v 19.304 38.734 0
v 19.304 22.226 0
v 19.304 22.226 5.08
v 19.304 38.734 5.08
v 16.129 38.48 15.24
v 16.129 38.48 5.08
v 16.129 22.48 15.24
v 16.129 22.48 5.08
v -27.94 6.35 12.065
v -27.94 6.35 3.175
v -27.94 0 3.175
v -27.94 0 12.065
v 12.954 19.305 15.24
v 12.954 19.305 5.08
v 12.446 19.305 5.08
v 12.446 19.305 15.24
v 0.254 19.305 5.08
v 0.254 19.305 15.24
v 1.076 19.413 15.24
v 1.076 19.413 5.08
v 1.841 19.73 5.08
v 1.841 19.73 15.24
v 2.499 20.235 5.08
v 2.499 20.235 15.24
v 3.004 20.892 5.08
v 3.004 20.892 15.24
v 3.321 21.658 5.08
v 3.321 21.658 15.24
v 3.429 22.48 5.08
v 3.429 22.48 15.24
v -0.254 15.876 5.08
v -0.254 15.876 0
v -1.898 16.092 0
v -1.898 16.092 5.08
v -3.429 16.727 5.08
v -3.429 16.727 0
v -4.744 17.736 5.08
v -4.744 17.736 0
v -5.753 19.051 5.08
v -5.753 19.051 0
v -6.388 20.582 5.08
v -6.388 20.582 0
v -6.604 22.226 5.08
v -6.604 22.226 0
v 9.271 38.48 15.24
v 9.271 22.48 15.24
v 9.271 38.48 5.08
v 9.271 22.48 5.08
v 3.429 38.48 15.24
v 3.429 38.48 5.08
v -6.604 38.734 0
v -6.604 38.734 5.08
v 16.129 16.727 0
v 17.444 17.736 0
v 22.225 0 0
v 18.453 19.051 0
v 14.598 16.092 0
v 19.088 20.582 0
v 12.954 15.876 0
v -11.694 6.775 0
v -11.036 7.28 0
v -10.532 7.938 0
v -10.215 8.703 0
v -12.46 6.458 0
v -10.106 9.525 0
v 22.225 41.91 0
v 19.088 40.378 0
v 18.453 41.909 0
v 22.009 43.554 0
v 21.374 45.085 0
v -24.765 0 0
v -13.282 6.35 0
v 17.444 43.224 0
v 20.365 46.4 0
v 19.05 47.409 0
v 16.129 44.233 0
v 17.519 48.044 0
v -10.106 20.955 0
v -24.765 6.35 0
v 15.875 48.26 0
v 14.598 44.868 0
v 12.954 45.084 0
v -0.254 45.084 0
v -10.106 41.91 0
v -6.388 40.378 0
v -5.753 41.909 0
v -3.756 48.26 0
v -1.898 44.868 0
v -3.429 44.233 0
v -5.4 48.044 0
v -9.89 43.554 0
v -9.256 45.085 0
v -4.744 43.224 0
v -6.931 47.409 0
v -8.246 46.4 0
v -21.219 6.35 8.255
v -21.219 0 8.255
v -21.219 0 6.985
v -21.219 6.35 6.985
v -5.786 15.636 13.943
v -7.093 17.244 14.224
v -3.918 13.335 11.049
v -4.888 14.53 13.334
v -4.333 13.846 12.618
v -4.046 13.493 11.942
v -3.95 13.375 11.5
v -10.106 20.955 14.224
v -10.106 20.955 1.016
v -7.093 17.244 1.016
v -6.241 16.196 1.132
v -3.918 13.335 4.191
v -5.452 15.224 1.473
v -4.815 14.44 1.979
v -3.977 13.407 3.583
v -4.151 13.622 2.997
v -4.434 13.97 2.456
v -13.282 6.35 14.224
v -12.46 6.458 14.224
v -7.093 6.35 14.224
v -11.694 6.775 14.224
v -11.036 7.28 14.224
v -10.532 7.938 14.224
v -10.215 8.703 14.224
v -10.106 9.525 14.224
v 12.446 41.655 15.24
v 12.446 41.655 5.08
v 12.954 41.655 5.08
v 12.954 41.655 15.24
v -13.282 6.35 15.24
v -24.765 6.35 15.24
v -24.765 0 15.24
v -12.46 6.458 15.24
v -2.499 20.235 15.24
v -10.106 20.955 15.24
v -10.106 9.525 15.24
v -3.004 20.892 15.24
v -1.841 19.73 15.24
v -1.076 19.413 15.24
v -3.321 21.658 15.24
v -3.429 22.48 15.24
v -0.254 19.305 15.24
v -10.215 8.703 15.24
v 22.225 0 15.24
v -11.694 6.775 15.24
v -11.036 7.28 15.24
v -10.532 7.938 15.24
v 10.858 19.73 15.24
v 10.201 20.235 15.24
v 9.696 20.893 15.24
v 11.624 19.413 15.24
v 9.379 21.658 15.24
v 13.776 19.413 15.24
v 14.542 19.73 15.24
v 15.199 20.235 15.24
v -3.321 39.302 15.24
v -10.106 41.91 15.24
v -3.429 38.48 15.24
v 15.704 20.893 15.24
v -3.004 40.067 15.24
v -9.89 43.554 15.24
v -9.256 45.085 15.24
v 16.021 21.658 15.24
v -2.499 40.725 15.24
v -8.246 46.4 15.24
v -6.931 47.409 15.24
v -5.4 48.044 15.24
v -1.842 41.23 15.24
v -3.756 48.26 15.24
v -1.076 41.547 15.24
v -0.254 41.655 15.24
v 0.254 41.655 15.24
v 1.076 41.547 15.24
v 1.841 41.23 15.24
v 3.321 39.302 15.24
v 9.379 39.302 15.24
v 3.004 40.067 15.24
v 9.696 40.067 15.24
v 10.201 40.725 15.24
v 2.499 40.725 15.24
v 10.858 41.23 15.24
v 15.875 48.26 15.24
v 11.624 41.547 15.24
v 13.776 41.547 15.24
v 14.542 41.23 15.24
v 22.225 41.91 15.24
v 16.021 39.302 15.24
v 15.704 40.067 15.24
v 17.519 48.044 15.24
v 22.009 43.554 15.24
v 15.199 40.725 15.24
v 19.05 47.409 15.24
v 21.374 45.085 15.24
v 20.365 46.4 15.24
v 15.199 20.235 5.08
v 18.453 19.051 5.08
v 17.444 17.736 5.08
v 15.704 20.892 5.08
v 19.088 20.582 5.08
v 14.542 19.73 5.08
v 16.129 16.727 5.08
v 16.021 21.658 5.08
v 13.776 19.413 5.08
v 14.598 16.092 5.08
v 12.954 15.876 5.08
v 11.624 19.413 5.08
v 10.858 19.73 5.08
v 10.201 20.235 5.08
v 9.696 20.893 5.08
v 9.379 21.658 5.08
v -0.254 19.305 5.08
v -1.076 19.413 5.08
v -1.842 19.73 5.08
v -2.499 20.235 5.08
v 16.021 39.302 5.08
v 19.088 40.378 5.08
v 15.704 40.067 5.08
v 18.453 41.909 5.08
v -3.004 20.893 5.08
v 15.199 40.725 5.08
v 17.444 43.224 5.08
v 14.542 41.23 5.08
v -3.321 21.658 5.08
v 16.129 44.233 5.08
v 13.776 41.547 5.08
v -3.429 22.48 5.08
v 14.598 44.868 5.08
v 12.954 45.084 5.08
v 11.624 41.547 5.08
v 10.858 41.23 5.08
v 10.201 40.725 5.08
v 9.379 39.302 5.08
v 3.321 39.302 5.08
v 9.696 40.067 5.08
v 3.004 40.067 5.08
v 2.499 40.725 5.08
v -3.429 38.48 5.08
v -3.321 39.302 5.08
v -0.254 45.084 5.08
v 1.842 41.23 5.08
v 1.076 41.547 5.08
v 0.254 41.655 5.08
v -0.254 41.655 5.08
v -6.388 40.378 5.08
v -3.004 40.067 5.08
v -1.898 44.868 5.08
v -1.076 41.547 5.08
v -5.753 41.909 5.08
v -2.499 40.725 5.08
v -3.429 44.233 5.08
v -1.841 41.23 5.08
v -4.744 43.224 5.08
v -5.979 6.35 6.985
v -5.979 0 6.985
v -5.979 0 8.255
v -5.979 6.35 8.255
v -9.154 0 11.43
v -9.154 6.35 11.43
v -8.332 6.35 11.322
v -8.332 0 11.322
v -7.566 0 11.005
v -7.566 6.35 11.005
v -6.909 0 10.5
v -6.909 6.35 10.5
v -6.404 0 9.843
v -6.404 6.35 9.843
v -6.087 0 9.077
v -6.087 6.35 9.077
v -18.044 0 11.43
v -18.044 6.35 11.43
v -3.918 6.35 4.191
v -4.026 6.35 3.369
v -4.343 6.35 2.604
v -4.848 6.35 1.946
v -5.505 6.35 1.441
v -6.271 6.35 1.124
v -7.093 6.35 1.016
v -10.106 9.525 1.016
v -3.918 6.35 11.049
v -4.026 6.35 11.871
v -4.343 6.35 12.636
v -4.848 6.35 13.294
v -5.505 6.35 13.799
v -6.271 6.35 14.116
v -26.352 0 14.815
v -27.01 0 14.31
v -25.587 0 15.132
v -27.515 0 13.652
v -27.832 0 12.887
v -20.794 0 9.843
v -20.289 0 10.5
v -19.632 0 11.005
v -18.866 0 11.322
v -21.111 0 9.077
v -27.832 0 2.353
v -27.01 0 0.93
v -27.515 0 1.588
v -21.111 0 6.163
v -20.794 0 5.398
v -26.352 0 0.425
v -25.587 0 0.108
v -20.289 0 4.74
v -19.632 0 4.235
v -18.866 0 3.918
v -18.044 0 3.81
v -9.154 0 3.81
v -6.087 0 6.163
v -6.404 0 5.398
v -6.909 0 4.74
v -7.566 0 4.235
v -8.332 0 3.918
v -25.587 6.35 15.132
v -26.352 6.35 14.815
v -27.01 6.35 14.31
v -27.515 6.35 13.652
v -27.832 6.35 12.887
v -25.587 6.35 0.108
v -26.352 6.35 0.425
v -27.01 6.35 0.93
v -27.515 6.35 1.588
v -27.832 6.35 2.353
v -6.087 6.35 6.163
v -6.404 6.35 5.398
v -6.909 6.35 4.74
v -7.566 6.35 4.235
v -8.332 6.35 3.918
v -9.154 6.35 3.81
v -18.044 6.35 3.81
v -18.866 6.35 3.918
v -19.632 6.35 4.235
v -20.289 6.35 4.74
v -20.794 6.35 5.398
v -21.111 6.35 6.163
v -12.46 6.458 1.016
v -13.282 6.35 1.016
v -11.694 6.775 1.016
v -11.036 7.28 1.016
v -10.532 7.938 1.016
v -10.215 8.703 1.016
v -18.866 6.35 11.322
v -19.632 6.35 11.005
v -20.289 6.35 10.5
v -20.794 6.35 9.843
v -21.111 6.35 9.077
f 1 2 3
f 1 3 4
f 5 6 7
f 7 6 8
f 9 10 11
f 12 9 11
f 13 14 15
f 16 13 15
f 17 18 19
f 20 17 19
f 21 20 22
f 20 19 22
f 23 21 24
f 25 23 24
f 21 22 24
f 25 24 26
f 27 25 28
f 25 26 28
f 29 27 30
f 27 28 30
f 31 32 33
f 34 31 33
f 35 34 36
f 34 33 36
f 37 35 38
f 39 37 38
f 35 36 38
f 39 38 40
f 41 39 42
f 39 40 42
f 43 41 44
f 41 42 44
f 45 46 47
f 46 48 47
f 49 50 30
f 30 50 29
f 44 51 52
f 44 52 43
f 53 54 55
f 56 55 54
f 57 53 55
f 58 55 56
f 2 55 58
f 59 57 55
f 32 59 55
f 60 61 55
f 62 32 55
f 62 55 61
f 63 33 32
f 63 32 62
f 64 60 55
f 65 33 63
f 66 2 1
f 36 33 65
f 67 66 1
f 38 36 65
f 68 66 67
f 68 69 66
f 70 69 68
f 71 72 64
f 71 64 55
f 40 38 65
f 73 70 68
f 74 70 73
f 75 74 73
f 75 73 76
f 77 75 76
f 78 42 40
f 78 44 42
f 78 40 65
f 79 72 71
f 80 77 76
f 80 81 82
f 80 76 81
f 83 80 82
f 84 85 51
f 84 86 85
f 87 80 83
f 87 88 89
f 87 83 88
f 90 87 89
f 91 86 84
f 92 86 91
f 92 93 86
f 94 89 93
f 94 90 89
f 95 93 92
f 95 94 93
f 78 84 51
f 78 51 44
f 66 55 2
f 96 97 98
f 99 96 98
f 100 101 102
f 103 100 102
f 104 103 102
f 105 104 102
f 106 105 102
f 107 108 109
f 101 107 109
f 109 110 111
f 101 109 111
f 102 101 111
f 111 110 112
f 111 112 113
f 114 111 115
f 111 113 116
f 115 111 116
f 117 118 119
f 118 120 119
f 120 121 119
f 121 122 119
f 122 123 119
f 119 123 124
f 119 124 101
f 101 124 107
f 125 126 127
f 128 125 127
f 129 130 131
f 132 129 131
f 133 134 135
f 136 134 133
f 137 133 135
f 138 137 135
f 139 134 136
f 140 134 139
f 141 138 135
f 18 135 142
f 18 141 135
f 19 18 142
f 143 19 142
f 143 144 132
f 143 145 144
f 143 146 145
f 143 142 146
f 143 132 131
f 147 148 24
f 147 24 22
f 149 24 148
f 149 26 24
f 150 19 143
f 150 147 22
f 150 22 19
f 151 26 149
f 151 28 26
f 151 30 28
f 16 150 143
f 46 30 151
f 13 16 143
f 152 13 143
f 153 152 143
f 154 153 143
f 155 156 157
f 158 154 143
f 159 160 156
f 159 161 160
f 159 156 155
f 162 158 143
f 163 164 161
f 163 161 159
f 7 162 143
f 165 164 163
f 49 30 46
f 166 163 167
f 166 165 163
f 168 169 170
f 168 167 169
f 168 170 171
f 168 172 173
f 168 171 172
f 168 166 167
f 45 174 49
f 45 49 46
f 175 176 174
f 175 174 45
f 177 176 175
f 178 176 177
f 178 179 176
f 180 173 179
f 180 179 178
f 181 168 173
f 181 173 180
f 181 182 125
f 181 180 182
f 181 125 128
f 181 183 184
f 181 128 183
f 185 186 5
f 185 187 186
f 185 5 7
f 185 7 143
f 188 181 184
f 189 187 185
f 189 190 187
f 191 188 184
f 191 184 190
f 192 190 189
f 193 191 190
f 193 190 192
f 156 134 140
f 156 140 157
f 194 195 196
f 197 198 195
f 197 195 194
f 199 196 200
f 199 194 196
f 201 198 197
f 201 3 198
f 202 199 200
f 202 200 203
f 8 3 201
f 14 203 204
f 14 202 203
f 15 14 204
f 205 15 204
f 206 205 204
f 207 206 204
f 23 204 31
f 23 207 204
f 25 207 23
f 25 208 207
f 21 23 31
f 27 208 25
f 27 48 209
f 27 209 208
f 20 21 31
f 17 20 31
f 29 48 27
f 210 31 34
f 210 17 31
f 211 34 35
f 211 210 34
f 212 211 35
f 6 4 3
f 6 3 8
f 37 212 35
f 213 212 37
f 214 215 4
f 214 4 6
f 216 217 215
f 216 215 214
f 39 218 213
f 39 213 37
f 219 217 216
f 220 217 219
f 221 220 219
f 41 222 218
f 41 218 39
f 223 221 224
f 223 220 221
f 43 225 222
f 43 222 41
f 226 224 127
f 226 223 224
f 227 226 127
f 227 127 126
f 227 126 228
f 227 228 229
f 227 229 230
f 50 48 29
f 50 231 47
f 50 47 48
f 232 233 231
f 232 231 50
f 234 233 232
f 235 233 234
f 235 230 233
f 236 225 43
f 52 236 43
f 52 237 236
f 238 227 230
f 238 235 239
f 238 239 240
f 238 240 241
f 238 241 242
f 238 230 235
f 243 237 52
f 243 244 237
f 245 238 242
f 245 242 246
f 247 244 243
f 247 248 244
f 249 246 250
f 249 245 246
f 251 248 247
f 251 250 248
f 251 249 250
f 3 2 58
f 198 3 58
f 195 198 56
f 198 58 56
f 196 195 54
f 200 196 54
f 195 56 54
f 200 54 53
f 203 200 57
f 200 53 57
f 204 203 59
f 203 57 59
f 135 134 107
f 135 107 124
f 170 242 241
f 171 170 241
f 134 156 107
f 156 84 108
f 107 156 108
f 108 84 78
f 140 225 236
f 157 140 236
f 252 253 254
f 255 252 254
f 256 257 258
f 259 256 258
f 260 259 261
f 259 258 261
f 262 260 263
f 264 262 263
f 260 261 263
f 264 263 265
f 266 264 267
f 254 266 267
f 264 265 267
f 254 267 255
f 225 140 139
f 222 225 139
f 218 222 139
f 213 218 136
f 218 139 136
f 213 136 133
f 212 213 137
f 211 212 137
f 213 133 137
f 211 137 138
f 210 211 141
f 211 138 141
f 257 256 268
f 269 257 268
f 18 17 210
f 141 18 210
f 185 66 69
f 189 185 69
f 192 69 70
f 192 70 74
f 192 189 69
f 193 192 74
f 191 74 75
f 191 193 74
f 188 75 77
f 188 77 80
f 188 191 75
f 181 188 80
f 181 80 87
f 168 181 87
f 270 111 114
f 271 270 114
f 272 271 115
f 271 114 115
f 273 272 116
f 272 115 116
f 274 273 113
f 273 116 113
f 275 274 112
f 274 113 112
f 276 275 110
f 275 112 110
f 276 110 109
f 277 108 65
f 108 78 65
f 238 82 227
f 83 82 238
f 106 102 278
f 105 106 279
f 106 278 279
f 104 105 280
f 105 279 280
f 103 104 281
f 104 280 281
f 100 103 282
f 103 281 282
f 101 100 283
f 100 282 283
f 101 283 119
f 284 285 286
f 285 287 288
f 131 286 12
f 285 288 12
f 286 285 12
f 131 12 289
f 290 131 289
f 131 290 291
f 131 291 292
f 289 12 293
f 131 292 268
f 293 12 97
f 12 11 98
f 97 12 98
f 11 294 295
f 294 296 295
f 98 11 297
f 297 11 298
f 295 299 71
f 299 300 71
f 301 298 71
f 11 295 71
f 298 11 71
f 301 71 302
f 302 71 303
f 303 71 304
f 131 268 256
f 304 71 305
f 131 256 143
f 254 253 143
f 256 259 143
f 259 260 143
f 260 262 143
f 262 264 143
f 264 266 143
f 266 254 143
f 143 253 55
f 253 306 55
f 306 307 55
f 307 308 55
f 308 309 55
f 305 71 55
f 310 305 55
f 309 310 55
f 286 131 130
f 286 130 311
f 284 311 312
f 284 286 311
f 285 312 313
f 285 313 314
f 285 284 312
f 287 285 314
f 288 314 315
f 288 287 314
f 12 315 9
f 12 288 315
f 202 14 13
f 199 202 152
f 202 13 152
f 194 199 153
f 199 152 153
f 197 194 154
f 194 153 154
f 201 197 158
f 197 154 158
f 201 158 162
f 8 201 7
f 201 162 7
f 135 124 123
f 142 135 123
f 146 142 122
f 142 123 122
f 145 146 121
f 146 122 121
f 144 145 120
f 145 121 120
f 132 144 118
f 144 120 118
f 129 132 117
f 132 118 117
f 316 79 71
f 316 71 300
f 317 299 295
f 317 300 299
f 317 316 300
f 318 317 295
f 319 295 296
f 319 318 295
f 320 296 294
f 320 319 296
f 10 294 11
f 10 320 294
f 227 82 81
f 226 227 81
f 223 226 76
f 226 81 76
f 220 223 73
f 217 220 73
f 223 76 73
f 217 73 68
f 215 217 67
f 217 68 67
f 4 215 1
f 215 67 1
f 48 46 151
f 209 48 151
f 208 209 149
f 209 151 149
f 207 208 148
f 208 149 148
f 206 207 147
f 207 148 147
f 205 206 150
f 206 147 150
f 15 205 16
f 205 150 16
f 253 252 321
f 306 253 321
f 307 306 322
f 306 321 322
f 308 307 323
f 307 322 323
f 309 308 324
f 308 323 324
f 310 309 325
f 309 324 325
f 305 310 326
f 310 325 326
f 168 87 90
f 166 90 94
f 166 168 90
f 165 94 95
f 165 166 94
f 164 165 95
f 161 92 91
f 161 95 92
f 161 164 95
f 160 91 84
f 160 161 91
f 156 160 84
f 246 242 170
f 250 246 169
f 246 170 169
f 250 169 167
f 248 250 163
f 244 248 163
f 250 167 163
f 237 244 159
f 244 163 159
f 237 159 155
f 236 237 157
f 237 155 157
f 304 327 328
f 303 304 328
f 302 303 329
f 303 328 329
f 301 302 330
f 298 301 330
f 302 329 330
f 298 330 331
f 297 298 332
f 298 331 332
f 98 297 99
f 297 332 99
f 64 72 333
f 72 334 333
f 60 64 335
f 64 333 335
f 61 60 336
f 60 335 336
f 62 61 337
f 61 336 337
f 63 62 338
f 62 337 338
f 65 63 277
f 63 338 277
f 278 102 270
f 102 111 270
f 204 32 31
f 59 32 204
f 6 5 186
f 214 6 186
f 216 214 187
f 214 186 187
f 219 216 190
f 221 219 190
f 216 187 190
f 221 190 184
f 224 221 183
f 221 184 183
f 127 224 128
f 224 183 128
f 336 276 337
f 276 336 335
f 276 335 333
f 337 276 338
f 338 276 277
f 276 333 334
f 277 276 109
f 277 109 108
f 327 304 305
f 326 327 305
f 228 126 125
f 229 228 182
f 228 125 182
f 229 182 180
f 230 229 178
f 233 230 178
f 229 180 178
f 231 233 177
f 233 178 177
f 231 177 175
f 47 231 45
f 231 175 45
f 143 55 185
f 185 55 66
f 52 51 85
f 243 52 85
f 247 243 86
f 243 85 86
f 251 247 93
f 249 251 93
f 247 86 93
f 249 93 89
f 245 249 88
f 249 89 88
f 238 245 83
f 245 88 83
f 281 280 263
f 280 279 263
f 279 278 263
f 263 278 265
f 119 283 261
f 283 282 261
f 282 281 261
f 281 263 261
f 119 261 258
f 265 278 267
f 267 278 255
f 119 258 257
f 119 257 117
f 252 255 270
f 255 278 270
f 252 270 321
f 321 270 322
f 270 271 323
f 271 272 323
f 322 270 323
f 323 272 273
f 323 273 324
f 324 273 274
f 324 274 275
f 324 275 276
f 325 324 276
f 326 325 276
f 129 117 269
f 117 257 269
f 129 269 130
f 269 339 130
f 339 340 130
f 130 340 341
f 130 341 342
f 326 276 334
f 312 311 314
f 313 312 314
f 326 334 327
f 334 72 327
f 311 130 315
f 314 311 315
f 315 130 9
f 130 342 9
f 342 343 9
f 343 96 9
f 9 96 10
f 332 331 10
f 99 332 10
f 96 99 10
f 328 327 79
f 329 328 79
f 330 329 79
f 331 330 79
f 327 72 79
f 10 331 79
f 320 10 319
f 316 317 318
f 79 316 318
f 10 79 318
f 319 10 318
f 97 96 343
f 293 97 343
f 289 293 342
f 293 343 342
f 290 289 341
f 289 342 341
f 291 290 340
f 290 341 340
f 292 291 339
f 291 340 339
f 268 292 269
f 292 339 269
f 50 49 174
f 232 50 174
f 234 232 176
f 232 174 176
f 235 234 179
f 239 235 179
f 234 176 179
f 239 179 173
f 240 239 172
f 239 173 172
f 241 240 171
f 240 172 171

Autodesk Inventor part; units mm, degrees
sketch "Sketch1" plane through (0, 0, 0) normal (0, 0, 1) x (1, 0, 0)
  line L0 (0, 57.912) -> (0, -9.652) projected
  line L1 (-63.881, 0) -> (36.576, 0) projected
  line L2 (22.225, 48.26) -> (-27.94, 48.26)
  line L3 (-27.94, 48.26) -> (-27.94, 0)
  line L4 (-27.94, 0) -> (22.225, 0)
  line L5 (22.225, 0) -> (22.225, 48.26)
  line L6 (0, 48.26) -> (0, 0) construction
  line L7 (12.7, 48.26) -> (12.7, 0) construction
  line L8 (3.429, 19.305) -> (-3.429, 19.305)
  line L9 (-3.429, 19.305) -> (-3.429, 41.655)
  line L10 (-3.429, 41.655) -> (3.429, 41.655)
  line L11 (3.429, 41.655) -> (3.429, 19.305)
  line L12 (3.429, 19.305) -> (-3.429, 41.655) construction
  line L13 (-3.429, 19.305) -> (3.429, 41.655) construction
  line L14 (16.129, 19.305) -> (9.271, 19.305)
  line L15 (9.271, 19.305) -> (9.271, 41.655)
  line L16 (9.271, 41.655) -> (16.129, 41.655)
  line L17 (16.129, 41.655) -> (16.129, 19.305)
  line L18 (16.129, 19.305) -> (9.271, 41.655) construction
  line L19 (9.271, 19.305) -> (16.129, 41.655) construction
  circle A0 centre (0, 38.48) radius 3.175 construction
  circle A1 centre (0, 30.48) radius 3.175 construction
  line L20 (-27.94, 0) -> (-49.53, 0)
  line L21 (-49.53, 0) -> (-49.53, 7.62)
  line L22 (-49.53, 7.62) -> (-27.94, 7.62)
  line L23 (-27.94, 7.62) -> (-27.94, 0)
  line L24 (-3.9178, 6.35) -> (-23.2802, 6.35)
  line L25 (-23.2802, 6.35) -> (-23.2802, 13.335)
  line L26 (-23.2802, 13.335) -> (-3.9178, 13.335)
  line L27 (-3.9178, 13.335) -> (-3.9178, 6.35)
  line L28 (-3.9178, 6.35) -> (-23.2802, 13.335) construction
  line L29 (-23.2802, 6.35) -> (-3.9178, 13.335) construction
  line L30 (-23.2802, 13.335) -> (-17.0915, 20.955)
  line L31 (-17.0915, 20.955) -> (-10.1065, 20.955)
  line L32 (-10.1065, 20.955) -> (-3.9178, 13.335)
  line L33 (-13.599, 9.8425) -> (-13.599, 20.955) construction
  circle A2 centre (0, 22.48) radius 6.35 construction
  point P0 (0, 0)
  point P1 (0, 25.4)
  point P2 (0, 30.48)
  point P3 (12.7, 30.48)
  point P4 (12.7, 30.48)
  dimension "d0" = 48.26
  dimension "d2" = 6.858
  dimension "d3" = 0
  dimension "d5" = 6.35
  dimension "d6" = 8
  dimension "d27" = 12.7
  dimension "d56" = 41.655
  dimension "d57" = 6.605
  dimension "d58" = 30.48
  dimension "d59" = 7.62
  dimension "d60" = 21.59
  dimension "d61" = 6.985
  dimension "d62" = 6.35
  dimension "d64" = 13.599
  dimension "d81" = 22.225
  dimension "d82" = 27.94
  dimension "d84" = 6.985
  dimension "d85" = 3.4925
  dimension "d86" = 7.62
  dimension "d104" = 12.7
  dimension "d105" = 8
  dimension "d119" = 13.599
extrude "Extrusion1" add sketch "Sketch1" along normal blind 15.24 contours L2 L5 L1 L0 L8 L11 L10 | L0 L10 L9 L8 L1 L3 L2 | L24 L25 L26 L27 | L26 L30 L31 L32
ref_plane "Work Plane4" through (-22.225, 7.62, 15.24) normal (0, 1, 0) x (1, 0, 0)
sketch "Sketch4" plane through (-22.225, 7.62, 15.24) normal (0, 1, 0) x (1, 0, 0)
  line L0 (-23.495, 8.255) -> (0, 8.255) projected
  line L1 (-23.495, 8.255) -> (-23.495, -17.78) projected
  line L2 (-23.495, 8.255) -> (-14.605, 8.255)
  line L3 (-14.605, 8.255) -> (-14.605, 0)
  line L4 (-14.605, 0) -> (-23.495, 0)
  line L5 (-23.495, 0) -> (-23.495, 8.255)
  line L6 (44.45, 0) -> (0, 0) projected
  point P0 (22.225, 15.24)
  dimension "d28" = 0
  dimension "d29" = 8.89
extrude "Extrusion4" [suppressed]
fillet "Fillet1" radius 3.175 8 edges at (-3.429, 19.305, 7.62) (3.429, 19.305, 7.62) (3.429, 41.655, 7.62) (-3.429, 41.655, 7.62) (9.271, 41.655, 7.62) (16.129, 41.655, 7.62) (16.129, 19.305, 7.62) (9.271, 19.305, 7.62)
ref_plane "Work Plane1" through (0, 22.48, 0) normal (-1, 0, 0) x (0, 0, 1)
ref_plane "Work Plane2" through (0, 0, -9.525) normal (0, 0, 1) x (1, 0, 0)
extrude "Extrusion8" cut sketch "Sketch1" along normal up to next contours L24 L25 L26 L27 | L26 L30 L31 L32
ref_plane "Work Plane5" through (-13.599, 6.35, 15.24) normal (1, 0, 0) x (0, 0, -1)
sketch "Sketch7" plane through (22.225, 0, 0) normal (0, -1, 0) x (1, 0, 0)
  line L0 (0, 0) -> (0, 15.24) projected
  line L1 (-50.165, 15.24) -> (0, 15.24) projected
  line L2 (-50.165, 0) -> (0, 0) projected
  line L3 (-71.755, 7.62) -> (0, 7.62) construction
  line L4 (-53.204, 3.81) -> (-68.444, 3.81)
  line L5 (-68.444, 3.81) -> (-68.444, 11.43)
  line L6 (-68.444, 11.43) -> (-53.204, 11.43)
  line L7 (-53.204, 11.43) -> (-53.204, 3.81)
  line L8 (-53.204, 3.81) -> (-68.444, 11.43) construction
  line L9 (-68.444, 3.81) -> (-53.204, 11.43) construction
  line L10 (-43.444, 3.81) -> (-28.204, 3.81)
  line L11 (-28.204, 3.81) -> (-28.204, 11.43)
  line L12 (-28.204, 11.43) -> (-43.444, 11.43)
  line L13 (-43.444, 11.43) -> (-43.444, 3.81)
  line L14 (-43.444, 3.81) -> (-28.204, 11.43) construction
  line L15 (-28.204, 3.81) -> (-43.444, 11.43) construction
  line L16 (-50.165, 0) -> (0, 0) projected
  line L17 (0, 0) -> (0, 15.24) projected
  line L18 (-50.165, 15.24) -> (0, 15.24) projected
  line L19 (-45.5052, 0) -> (-26.1428, 0) projected
  line L20 (-26.1428, 15.24) -> (-45.5052, 15.24) projected
  line L21 (-45.5052, 0) -> (-45.5052, 15.24) projected
  line L22 (-26.1428, 0) -> (-26.1428, 15.24) projected
  line L23 (-35.824, 18.288) -> (-35.824, -3.048) projected
  line L24 (-50.165, 0) -> (-50.165, 15.24) projected
  line L25 (-22.225, 18.288) -> (-22.225, -3.048) projected
  point P0 (-22.225, 0)
  point P1 (-60.824, 7.62)
  point P2 (-35.824, 7.62)
  point P3 (-22.225, 0)
  point P4 (-22.225, 0)
  point P5 (-22.225, 0)
  point P6 (-25.856, 0)
  point P7 (-35.824, 7.62)
  dimension "d69" = 7.62
  dimension "d70" = 15.24
  dimension "d71" = 25
  dimension "d88" = 0
  dimension "d120" = 9.6812
extrude "Extrusion10" cut sketch "Sketch7" against normal up to surface (6.35 mm away) contours L23 L12 L11 L10 | L10 L13 L12 L23
sketch "Sketch9" plane through (0, 0, 0) normal (0, 0, 1) x (1, 0, 0)
  line L0 (-10.1063, 6.35) -> (-27.94, 6.35)
  line L1 (-27.94, 6.35) -> (-27.94, 48.26)
  line L2 (-27.94, 48.26) -> (-10.1063, 48.26)
  line L3 (-10.1063, 48.26) -> (-10.1063, 6.35)
  line L4 (-3.9178, 6.35) -> (-23.2802, 6.35) projected
  point P0 (0, 0)
  dimension "d101" = 0
extrude "Extrusion12" cut sketch "Sketch9" along normal up to next
fillet "Fillet15" radius 3.175 4 edges at (-5.979, 3.175, 3.81) (-5.979, 3.175, 11.43) (-21.219, 3.175, 11.43) (-21.219, 3.175, 3.81)
sketch "Sketch10" plane through (0, 0, 0) normal (0, 0, -1) x (-1, 0, 0)
  line L0 (10.1065, 20.955) -> (3.9178, 13.335) projected
  line L1 (3.9178, 6.35) -> (3.9178, 13.335) projected
  line L2 (27.94, 6.35) -> (3.9178, 6.35) projected
  line L3 (10.1065, 20.955) -> (10.1065, 6.35)
  line L4 (3.9178, 6.35) -> (27.94, 6.35) projected
  point P0 (0, 0)
extrude "Extrusion13" add sketch "Sketch10" against normal blind 1.016
sketch "Sketch11" plane through (0, 0, 15.24) normal (0, 0, 1) x (1, 0, 0)
  line L0 (-10.1065, 20.955) -> (-10.1065, 6.35) projected
  line L1 (-10.1063, 20.9547) -> (-3.9178, 13.335) projected
  line L2 (-3.9178, 13.335) -> (-3.9178, 6.35) projected
  line L3 (-3.9178, 6.35) -> (-27.94, 6.35) projected
  line L4 (-10.1063, 20.9547) -> (-10.1065, 6.35)
  point P0 (0, 0)
extrude "Extrusion14" add sketch "Sketch11" against normal blind 1.016
fillet "Fillet18" radius 3.175 2 edges at (-3.9178, 9.8425, 1.016) (-3.9178, 9.8425, 14.224)
fillet "Fillet19" radius 3.175 2 edges at (-27.94, 3.175, 0) (-27.94, 3.175, 15.24)
fillet "Fillet20" radius 3.175 2 edges at (-10.1065, 6.35, 14.732) (-10.1065, 6.35, 0.508)
sketch "Sketch12" plane through (0, 0, 0) normal (0, 0, -1) x (-1, 0, 0)
  line L0 (-12.7, 30.48) -> (0, 30.48) construction
  line L1 (0.254, 15.876) -> (-12.954, 15.876)
  line L2 (-19.304, 22.226) -> (-19.304, 38.734)
  line L3 (-12.954, 45.084) -> (0.254, 45.084)
  line L4 (6.604, 38.734) -> (6.604, 22.226)
  line L5 (6.604, 15.876) -> (-19.304, 45.084) construction
  line L6 (-19.304, 15.876) -> (6.604, 45.084) construction
  arc A0 (-12.954, 45.084) -> (-19.304, 38.734) centre (-12.954, 38.734) ccw
  arc A1 (6.604, 38.734) -> (0.254, 45.084) centre (0.254, 38.734) ccw
  arc A2 (0.254, 15.876) -> (6.604, 22.226) centre (0.254, 22.226) ccw
  arc A3 (-19.304, 22.226) -> (-12.954, 15.876) centre (-12.954, 22.226) ccw
  point P0 (0, 0)
  point P1 (-6.35, 30.48)
  dimension "d113" = 6.604
  dimension "d114" = 14.604
  dimension "d115" = 6.35
extrude "Extrusion15" cut sketch "Sketch12" against normal blind 5.08
fillet "Fillet21" radius 6.35 2 edges at (22.225, 48.26, 7.62) (-10.1063, 48.26, 7.62)
equation "\"d85\" = 0.5 * d84"
properties part number "J005556" material "VERO BLACK"
